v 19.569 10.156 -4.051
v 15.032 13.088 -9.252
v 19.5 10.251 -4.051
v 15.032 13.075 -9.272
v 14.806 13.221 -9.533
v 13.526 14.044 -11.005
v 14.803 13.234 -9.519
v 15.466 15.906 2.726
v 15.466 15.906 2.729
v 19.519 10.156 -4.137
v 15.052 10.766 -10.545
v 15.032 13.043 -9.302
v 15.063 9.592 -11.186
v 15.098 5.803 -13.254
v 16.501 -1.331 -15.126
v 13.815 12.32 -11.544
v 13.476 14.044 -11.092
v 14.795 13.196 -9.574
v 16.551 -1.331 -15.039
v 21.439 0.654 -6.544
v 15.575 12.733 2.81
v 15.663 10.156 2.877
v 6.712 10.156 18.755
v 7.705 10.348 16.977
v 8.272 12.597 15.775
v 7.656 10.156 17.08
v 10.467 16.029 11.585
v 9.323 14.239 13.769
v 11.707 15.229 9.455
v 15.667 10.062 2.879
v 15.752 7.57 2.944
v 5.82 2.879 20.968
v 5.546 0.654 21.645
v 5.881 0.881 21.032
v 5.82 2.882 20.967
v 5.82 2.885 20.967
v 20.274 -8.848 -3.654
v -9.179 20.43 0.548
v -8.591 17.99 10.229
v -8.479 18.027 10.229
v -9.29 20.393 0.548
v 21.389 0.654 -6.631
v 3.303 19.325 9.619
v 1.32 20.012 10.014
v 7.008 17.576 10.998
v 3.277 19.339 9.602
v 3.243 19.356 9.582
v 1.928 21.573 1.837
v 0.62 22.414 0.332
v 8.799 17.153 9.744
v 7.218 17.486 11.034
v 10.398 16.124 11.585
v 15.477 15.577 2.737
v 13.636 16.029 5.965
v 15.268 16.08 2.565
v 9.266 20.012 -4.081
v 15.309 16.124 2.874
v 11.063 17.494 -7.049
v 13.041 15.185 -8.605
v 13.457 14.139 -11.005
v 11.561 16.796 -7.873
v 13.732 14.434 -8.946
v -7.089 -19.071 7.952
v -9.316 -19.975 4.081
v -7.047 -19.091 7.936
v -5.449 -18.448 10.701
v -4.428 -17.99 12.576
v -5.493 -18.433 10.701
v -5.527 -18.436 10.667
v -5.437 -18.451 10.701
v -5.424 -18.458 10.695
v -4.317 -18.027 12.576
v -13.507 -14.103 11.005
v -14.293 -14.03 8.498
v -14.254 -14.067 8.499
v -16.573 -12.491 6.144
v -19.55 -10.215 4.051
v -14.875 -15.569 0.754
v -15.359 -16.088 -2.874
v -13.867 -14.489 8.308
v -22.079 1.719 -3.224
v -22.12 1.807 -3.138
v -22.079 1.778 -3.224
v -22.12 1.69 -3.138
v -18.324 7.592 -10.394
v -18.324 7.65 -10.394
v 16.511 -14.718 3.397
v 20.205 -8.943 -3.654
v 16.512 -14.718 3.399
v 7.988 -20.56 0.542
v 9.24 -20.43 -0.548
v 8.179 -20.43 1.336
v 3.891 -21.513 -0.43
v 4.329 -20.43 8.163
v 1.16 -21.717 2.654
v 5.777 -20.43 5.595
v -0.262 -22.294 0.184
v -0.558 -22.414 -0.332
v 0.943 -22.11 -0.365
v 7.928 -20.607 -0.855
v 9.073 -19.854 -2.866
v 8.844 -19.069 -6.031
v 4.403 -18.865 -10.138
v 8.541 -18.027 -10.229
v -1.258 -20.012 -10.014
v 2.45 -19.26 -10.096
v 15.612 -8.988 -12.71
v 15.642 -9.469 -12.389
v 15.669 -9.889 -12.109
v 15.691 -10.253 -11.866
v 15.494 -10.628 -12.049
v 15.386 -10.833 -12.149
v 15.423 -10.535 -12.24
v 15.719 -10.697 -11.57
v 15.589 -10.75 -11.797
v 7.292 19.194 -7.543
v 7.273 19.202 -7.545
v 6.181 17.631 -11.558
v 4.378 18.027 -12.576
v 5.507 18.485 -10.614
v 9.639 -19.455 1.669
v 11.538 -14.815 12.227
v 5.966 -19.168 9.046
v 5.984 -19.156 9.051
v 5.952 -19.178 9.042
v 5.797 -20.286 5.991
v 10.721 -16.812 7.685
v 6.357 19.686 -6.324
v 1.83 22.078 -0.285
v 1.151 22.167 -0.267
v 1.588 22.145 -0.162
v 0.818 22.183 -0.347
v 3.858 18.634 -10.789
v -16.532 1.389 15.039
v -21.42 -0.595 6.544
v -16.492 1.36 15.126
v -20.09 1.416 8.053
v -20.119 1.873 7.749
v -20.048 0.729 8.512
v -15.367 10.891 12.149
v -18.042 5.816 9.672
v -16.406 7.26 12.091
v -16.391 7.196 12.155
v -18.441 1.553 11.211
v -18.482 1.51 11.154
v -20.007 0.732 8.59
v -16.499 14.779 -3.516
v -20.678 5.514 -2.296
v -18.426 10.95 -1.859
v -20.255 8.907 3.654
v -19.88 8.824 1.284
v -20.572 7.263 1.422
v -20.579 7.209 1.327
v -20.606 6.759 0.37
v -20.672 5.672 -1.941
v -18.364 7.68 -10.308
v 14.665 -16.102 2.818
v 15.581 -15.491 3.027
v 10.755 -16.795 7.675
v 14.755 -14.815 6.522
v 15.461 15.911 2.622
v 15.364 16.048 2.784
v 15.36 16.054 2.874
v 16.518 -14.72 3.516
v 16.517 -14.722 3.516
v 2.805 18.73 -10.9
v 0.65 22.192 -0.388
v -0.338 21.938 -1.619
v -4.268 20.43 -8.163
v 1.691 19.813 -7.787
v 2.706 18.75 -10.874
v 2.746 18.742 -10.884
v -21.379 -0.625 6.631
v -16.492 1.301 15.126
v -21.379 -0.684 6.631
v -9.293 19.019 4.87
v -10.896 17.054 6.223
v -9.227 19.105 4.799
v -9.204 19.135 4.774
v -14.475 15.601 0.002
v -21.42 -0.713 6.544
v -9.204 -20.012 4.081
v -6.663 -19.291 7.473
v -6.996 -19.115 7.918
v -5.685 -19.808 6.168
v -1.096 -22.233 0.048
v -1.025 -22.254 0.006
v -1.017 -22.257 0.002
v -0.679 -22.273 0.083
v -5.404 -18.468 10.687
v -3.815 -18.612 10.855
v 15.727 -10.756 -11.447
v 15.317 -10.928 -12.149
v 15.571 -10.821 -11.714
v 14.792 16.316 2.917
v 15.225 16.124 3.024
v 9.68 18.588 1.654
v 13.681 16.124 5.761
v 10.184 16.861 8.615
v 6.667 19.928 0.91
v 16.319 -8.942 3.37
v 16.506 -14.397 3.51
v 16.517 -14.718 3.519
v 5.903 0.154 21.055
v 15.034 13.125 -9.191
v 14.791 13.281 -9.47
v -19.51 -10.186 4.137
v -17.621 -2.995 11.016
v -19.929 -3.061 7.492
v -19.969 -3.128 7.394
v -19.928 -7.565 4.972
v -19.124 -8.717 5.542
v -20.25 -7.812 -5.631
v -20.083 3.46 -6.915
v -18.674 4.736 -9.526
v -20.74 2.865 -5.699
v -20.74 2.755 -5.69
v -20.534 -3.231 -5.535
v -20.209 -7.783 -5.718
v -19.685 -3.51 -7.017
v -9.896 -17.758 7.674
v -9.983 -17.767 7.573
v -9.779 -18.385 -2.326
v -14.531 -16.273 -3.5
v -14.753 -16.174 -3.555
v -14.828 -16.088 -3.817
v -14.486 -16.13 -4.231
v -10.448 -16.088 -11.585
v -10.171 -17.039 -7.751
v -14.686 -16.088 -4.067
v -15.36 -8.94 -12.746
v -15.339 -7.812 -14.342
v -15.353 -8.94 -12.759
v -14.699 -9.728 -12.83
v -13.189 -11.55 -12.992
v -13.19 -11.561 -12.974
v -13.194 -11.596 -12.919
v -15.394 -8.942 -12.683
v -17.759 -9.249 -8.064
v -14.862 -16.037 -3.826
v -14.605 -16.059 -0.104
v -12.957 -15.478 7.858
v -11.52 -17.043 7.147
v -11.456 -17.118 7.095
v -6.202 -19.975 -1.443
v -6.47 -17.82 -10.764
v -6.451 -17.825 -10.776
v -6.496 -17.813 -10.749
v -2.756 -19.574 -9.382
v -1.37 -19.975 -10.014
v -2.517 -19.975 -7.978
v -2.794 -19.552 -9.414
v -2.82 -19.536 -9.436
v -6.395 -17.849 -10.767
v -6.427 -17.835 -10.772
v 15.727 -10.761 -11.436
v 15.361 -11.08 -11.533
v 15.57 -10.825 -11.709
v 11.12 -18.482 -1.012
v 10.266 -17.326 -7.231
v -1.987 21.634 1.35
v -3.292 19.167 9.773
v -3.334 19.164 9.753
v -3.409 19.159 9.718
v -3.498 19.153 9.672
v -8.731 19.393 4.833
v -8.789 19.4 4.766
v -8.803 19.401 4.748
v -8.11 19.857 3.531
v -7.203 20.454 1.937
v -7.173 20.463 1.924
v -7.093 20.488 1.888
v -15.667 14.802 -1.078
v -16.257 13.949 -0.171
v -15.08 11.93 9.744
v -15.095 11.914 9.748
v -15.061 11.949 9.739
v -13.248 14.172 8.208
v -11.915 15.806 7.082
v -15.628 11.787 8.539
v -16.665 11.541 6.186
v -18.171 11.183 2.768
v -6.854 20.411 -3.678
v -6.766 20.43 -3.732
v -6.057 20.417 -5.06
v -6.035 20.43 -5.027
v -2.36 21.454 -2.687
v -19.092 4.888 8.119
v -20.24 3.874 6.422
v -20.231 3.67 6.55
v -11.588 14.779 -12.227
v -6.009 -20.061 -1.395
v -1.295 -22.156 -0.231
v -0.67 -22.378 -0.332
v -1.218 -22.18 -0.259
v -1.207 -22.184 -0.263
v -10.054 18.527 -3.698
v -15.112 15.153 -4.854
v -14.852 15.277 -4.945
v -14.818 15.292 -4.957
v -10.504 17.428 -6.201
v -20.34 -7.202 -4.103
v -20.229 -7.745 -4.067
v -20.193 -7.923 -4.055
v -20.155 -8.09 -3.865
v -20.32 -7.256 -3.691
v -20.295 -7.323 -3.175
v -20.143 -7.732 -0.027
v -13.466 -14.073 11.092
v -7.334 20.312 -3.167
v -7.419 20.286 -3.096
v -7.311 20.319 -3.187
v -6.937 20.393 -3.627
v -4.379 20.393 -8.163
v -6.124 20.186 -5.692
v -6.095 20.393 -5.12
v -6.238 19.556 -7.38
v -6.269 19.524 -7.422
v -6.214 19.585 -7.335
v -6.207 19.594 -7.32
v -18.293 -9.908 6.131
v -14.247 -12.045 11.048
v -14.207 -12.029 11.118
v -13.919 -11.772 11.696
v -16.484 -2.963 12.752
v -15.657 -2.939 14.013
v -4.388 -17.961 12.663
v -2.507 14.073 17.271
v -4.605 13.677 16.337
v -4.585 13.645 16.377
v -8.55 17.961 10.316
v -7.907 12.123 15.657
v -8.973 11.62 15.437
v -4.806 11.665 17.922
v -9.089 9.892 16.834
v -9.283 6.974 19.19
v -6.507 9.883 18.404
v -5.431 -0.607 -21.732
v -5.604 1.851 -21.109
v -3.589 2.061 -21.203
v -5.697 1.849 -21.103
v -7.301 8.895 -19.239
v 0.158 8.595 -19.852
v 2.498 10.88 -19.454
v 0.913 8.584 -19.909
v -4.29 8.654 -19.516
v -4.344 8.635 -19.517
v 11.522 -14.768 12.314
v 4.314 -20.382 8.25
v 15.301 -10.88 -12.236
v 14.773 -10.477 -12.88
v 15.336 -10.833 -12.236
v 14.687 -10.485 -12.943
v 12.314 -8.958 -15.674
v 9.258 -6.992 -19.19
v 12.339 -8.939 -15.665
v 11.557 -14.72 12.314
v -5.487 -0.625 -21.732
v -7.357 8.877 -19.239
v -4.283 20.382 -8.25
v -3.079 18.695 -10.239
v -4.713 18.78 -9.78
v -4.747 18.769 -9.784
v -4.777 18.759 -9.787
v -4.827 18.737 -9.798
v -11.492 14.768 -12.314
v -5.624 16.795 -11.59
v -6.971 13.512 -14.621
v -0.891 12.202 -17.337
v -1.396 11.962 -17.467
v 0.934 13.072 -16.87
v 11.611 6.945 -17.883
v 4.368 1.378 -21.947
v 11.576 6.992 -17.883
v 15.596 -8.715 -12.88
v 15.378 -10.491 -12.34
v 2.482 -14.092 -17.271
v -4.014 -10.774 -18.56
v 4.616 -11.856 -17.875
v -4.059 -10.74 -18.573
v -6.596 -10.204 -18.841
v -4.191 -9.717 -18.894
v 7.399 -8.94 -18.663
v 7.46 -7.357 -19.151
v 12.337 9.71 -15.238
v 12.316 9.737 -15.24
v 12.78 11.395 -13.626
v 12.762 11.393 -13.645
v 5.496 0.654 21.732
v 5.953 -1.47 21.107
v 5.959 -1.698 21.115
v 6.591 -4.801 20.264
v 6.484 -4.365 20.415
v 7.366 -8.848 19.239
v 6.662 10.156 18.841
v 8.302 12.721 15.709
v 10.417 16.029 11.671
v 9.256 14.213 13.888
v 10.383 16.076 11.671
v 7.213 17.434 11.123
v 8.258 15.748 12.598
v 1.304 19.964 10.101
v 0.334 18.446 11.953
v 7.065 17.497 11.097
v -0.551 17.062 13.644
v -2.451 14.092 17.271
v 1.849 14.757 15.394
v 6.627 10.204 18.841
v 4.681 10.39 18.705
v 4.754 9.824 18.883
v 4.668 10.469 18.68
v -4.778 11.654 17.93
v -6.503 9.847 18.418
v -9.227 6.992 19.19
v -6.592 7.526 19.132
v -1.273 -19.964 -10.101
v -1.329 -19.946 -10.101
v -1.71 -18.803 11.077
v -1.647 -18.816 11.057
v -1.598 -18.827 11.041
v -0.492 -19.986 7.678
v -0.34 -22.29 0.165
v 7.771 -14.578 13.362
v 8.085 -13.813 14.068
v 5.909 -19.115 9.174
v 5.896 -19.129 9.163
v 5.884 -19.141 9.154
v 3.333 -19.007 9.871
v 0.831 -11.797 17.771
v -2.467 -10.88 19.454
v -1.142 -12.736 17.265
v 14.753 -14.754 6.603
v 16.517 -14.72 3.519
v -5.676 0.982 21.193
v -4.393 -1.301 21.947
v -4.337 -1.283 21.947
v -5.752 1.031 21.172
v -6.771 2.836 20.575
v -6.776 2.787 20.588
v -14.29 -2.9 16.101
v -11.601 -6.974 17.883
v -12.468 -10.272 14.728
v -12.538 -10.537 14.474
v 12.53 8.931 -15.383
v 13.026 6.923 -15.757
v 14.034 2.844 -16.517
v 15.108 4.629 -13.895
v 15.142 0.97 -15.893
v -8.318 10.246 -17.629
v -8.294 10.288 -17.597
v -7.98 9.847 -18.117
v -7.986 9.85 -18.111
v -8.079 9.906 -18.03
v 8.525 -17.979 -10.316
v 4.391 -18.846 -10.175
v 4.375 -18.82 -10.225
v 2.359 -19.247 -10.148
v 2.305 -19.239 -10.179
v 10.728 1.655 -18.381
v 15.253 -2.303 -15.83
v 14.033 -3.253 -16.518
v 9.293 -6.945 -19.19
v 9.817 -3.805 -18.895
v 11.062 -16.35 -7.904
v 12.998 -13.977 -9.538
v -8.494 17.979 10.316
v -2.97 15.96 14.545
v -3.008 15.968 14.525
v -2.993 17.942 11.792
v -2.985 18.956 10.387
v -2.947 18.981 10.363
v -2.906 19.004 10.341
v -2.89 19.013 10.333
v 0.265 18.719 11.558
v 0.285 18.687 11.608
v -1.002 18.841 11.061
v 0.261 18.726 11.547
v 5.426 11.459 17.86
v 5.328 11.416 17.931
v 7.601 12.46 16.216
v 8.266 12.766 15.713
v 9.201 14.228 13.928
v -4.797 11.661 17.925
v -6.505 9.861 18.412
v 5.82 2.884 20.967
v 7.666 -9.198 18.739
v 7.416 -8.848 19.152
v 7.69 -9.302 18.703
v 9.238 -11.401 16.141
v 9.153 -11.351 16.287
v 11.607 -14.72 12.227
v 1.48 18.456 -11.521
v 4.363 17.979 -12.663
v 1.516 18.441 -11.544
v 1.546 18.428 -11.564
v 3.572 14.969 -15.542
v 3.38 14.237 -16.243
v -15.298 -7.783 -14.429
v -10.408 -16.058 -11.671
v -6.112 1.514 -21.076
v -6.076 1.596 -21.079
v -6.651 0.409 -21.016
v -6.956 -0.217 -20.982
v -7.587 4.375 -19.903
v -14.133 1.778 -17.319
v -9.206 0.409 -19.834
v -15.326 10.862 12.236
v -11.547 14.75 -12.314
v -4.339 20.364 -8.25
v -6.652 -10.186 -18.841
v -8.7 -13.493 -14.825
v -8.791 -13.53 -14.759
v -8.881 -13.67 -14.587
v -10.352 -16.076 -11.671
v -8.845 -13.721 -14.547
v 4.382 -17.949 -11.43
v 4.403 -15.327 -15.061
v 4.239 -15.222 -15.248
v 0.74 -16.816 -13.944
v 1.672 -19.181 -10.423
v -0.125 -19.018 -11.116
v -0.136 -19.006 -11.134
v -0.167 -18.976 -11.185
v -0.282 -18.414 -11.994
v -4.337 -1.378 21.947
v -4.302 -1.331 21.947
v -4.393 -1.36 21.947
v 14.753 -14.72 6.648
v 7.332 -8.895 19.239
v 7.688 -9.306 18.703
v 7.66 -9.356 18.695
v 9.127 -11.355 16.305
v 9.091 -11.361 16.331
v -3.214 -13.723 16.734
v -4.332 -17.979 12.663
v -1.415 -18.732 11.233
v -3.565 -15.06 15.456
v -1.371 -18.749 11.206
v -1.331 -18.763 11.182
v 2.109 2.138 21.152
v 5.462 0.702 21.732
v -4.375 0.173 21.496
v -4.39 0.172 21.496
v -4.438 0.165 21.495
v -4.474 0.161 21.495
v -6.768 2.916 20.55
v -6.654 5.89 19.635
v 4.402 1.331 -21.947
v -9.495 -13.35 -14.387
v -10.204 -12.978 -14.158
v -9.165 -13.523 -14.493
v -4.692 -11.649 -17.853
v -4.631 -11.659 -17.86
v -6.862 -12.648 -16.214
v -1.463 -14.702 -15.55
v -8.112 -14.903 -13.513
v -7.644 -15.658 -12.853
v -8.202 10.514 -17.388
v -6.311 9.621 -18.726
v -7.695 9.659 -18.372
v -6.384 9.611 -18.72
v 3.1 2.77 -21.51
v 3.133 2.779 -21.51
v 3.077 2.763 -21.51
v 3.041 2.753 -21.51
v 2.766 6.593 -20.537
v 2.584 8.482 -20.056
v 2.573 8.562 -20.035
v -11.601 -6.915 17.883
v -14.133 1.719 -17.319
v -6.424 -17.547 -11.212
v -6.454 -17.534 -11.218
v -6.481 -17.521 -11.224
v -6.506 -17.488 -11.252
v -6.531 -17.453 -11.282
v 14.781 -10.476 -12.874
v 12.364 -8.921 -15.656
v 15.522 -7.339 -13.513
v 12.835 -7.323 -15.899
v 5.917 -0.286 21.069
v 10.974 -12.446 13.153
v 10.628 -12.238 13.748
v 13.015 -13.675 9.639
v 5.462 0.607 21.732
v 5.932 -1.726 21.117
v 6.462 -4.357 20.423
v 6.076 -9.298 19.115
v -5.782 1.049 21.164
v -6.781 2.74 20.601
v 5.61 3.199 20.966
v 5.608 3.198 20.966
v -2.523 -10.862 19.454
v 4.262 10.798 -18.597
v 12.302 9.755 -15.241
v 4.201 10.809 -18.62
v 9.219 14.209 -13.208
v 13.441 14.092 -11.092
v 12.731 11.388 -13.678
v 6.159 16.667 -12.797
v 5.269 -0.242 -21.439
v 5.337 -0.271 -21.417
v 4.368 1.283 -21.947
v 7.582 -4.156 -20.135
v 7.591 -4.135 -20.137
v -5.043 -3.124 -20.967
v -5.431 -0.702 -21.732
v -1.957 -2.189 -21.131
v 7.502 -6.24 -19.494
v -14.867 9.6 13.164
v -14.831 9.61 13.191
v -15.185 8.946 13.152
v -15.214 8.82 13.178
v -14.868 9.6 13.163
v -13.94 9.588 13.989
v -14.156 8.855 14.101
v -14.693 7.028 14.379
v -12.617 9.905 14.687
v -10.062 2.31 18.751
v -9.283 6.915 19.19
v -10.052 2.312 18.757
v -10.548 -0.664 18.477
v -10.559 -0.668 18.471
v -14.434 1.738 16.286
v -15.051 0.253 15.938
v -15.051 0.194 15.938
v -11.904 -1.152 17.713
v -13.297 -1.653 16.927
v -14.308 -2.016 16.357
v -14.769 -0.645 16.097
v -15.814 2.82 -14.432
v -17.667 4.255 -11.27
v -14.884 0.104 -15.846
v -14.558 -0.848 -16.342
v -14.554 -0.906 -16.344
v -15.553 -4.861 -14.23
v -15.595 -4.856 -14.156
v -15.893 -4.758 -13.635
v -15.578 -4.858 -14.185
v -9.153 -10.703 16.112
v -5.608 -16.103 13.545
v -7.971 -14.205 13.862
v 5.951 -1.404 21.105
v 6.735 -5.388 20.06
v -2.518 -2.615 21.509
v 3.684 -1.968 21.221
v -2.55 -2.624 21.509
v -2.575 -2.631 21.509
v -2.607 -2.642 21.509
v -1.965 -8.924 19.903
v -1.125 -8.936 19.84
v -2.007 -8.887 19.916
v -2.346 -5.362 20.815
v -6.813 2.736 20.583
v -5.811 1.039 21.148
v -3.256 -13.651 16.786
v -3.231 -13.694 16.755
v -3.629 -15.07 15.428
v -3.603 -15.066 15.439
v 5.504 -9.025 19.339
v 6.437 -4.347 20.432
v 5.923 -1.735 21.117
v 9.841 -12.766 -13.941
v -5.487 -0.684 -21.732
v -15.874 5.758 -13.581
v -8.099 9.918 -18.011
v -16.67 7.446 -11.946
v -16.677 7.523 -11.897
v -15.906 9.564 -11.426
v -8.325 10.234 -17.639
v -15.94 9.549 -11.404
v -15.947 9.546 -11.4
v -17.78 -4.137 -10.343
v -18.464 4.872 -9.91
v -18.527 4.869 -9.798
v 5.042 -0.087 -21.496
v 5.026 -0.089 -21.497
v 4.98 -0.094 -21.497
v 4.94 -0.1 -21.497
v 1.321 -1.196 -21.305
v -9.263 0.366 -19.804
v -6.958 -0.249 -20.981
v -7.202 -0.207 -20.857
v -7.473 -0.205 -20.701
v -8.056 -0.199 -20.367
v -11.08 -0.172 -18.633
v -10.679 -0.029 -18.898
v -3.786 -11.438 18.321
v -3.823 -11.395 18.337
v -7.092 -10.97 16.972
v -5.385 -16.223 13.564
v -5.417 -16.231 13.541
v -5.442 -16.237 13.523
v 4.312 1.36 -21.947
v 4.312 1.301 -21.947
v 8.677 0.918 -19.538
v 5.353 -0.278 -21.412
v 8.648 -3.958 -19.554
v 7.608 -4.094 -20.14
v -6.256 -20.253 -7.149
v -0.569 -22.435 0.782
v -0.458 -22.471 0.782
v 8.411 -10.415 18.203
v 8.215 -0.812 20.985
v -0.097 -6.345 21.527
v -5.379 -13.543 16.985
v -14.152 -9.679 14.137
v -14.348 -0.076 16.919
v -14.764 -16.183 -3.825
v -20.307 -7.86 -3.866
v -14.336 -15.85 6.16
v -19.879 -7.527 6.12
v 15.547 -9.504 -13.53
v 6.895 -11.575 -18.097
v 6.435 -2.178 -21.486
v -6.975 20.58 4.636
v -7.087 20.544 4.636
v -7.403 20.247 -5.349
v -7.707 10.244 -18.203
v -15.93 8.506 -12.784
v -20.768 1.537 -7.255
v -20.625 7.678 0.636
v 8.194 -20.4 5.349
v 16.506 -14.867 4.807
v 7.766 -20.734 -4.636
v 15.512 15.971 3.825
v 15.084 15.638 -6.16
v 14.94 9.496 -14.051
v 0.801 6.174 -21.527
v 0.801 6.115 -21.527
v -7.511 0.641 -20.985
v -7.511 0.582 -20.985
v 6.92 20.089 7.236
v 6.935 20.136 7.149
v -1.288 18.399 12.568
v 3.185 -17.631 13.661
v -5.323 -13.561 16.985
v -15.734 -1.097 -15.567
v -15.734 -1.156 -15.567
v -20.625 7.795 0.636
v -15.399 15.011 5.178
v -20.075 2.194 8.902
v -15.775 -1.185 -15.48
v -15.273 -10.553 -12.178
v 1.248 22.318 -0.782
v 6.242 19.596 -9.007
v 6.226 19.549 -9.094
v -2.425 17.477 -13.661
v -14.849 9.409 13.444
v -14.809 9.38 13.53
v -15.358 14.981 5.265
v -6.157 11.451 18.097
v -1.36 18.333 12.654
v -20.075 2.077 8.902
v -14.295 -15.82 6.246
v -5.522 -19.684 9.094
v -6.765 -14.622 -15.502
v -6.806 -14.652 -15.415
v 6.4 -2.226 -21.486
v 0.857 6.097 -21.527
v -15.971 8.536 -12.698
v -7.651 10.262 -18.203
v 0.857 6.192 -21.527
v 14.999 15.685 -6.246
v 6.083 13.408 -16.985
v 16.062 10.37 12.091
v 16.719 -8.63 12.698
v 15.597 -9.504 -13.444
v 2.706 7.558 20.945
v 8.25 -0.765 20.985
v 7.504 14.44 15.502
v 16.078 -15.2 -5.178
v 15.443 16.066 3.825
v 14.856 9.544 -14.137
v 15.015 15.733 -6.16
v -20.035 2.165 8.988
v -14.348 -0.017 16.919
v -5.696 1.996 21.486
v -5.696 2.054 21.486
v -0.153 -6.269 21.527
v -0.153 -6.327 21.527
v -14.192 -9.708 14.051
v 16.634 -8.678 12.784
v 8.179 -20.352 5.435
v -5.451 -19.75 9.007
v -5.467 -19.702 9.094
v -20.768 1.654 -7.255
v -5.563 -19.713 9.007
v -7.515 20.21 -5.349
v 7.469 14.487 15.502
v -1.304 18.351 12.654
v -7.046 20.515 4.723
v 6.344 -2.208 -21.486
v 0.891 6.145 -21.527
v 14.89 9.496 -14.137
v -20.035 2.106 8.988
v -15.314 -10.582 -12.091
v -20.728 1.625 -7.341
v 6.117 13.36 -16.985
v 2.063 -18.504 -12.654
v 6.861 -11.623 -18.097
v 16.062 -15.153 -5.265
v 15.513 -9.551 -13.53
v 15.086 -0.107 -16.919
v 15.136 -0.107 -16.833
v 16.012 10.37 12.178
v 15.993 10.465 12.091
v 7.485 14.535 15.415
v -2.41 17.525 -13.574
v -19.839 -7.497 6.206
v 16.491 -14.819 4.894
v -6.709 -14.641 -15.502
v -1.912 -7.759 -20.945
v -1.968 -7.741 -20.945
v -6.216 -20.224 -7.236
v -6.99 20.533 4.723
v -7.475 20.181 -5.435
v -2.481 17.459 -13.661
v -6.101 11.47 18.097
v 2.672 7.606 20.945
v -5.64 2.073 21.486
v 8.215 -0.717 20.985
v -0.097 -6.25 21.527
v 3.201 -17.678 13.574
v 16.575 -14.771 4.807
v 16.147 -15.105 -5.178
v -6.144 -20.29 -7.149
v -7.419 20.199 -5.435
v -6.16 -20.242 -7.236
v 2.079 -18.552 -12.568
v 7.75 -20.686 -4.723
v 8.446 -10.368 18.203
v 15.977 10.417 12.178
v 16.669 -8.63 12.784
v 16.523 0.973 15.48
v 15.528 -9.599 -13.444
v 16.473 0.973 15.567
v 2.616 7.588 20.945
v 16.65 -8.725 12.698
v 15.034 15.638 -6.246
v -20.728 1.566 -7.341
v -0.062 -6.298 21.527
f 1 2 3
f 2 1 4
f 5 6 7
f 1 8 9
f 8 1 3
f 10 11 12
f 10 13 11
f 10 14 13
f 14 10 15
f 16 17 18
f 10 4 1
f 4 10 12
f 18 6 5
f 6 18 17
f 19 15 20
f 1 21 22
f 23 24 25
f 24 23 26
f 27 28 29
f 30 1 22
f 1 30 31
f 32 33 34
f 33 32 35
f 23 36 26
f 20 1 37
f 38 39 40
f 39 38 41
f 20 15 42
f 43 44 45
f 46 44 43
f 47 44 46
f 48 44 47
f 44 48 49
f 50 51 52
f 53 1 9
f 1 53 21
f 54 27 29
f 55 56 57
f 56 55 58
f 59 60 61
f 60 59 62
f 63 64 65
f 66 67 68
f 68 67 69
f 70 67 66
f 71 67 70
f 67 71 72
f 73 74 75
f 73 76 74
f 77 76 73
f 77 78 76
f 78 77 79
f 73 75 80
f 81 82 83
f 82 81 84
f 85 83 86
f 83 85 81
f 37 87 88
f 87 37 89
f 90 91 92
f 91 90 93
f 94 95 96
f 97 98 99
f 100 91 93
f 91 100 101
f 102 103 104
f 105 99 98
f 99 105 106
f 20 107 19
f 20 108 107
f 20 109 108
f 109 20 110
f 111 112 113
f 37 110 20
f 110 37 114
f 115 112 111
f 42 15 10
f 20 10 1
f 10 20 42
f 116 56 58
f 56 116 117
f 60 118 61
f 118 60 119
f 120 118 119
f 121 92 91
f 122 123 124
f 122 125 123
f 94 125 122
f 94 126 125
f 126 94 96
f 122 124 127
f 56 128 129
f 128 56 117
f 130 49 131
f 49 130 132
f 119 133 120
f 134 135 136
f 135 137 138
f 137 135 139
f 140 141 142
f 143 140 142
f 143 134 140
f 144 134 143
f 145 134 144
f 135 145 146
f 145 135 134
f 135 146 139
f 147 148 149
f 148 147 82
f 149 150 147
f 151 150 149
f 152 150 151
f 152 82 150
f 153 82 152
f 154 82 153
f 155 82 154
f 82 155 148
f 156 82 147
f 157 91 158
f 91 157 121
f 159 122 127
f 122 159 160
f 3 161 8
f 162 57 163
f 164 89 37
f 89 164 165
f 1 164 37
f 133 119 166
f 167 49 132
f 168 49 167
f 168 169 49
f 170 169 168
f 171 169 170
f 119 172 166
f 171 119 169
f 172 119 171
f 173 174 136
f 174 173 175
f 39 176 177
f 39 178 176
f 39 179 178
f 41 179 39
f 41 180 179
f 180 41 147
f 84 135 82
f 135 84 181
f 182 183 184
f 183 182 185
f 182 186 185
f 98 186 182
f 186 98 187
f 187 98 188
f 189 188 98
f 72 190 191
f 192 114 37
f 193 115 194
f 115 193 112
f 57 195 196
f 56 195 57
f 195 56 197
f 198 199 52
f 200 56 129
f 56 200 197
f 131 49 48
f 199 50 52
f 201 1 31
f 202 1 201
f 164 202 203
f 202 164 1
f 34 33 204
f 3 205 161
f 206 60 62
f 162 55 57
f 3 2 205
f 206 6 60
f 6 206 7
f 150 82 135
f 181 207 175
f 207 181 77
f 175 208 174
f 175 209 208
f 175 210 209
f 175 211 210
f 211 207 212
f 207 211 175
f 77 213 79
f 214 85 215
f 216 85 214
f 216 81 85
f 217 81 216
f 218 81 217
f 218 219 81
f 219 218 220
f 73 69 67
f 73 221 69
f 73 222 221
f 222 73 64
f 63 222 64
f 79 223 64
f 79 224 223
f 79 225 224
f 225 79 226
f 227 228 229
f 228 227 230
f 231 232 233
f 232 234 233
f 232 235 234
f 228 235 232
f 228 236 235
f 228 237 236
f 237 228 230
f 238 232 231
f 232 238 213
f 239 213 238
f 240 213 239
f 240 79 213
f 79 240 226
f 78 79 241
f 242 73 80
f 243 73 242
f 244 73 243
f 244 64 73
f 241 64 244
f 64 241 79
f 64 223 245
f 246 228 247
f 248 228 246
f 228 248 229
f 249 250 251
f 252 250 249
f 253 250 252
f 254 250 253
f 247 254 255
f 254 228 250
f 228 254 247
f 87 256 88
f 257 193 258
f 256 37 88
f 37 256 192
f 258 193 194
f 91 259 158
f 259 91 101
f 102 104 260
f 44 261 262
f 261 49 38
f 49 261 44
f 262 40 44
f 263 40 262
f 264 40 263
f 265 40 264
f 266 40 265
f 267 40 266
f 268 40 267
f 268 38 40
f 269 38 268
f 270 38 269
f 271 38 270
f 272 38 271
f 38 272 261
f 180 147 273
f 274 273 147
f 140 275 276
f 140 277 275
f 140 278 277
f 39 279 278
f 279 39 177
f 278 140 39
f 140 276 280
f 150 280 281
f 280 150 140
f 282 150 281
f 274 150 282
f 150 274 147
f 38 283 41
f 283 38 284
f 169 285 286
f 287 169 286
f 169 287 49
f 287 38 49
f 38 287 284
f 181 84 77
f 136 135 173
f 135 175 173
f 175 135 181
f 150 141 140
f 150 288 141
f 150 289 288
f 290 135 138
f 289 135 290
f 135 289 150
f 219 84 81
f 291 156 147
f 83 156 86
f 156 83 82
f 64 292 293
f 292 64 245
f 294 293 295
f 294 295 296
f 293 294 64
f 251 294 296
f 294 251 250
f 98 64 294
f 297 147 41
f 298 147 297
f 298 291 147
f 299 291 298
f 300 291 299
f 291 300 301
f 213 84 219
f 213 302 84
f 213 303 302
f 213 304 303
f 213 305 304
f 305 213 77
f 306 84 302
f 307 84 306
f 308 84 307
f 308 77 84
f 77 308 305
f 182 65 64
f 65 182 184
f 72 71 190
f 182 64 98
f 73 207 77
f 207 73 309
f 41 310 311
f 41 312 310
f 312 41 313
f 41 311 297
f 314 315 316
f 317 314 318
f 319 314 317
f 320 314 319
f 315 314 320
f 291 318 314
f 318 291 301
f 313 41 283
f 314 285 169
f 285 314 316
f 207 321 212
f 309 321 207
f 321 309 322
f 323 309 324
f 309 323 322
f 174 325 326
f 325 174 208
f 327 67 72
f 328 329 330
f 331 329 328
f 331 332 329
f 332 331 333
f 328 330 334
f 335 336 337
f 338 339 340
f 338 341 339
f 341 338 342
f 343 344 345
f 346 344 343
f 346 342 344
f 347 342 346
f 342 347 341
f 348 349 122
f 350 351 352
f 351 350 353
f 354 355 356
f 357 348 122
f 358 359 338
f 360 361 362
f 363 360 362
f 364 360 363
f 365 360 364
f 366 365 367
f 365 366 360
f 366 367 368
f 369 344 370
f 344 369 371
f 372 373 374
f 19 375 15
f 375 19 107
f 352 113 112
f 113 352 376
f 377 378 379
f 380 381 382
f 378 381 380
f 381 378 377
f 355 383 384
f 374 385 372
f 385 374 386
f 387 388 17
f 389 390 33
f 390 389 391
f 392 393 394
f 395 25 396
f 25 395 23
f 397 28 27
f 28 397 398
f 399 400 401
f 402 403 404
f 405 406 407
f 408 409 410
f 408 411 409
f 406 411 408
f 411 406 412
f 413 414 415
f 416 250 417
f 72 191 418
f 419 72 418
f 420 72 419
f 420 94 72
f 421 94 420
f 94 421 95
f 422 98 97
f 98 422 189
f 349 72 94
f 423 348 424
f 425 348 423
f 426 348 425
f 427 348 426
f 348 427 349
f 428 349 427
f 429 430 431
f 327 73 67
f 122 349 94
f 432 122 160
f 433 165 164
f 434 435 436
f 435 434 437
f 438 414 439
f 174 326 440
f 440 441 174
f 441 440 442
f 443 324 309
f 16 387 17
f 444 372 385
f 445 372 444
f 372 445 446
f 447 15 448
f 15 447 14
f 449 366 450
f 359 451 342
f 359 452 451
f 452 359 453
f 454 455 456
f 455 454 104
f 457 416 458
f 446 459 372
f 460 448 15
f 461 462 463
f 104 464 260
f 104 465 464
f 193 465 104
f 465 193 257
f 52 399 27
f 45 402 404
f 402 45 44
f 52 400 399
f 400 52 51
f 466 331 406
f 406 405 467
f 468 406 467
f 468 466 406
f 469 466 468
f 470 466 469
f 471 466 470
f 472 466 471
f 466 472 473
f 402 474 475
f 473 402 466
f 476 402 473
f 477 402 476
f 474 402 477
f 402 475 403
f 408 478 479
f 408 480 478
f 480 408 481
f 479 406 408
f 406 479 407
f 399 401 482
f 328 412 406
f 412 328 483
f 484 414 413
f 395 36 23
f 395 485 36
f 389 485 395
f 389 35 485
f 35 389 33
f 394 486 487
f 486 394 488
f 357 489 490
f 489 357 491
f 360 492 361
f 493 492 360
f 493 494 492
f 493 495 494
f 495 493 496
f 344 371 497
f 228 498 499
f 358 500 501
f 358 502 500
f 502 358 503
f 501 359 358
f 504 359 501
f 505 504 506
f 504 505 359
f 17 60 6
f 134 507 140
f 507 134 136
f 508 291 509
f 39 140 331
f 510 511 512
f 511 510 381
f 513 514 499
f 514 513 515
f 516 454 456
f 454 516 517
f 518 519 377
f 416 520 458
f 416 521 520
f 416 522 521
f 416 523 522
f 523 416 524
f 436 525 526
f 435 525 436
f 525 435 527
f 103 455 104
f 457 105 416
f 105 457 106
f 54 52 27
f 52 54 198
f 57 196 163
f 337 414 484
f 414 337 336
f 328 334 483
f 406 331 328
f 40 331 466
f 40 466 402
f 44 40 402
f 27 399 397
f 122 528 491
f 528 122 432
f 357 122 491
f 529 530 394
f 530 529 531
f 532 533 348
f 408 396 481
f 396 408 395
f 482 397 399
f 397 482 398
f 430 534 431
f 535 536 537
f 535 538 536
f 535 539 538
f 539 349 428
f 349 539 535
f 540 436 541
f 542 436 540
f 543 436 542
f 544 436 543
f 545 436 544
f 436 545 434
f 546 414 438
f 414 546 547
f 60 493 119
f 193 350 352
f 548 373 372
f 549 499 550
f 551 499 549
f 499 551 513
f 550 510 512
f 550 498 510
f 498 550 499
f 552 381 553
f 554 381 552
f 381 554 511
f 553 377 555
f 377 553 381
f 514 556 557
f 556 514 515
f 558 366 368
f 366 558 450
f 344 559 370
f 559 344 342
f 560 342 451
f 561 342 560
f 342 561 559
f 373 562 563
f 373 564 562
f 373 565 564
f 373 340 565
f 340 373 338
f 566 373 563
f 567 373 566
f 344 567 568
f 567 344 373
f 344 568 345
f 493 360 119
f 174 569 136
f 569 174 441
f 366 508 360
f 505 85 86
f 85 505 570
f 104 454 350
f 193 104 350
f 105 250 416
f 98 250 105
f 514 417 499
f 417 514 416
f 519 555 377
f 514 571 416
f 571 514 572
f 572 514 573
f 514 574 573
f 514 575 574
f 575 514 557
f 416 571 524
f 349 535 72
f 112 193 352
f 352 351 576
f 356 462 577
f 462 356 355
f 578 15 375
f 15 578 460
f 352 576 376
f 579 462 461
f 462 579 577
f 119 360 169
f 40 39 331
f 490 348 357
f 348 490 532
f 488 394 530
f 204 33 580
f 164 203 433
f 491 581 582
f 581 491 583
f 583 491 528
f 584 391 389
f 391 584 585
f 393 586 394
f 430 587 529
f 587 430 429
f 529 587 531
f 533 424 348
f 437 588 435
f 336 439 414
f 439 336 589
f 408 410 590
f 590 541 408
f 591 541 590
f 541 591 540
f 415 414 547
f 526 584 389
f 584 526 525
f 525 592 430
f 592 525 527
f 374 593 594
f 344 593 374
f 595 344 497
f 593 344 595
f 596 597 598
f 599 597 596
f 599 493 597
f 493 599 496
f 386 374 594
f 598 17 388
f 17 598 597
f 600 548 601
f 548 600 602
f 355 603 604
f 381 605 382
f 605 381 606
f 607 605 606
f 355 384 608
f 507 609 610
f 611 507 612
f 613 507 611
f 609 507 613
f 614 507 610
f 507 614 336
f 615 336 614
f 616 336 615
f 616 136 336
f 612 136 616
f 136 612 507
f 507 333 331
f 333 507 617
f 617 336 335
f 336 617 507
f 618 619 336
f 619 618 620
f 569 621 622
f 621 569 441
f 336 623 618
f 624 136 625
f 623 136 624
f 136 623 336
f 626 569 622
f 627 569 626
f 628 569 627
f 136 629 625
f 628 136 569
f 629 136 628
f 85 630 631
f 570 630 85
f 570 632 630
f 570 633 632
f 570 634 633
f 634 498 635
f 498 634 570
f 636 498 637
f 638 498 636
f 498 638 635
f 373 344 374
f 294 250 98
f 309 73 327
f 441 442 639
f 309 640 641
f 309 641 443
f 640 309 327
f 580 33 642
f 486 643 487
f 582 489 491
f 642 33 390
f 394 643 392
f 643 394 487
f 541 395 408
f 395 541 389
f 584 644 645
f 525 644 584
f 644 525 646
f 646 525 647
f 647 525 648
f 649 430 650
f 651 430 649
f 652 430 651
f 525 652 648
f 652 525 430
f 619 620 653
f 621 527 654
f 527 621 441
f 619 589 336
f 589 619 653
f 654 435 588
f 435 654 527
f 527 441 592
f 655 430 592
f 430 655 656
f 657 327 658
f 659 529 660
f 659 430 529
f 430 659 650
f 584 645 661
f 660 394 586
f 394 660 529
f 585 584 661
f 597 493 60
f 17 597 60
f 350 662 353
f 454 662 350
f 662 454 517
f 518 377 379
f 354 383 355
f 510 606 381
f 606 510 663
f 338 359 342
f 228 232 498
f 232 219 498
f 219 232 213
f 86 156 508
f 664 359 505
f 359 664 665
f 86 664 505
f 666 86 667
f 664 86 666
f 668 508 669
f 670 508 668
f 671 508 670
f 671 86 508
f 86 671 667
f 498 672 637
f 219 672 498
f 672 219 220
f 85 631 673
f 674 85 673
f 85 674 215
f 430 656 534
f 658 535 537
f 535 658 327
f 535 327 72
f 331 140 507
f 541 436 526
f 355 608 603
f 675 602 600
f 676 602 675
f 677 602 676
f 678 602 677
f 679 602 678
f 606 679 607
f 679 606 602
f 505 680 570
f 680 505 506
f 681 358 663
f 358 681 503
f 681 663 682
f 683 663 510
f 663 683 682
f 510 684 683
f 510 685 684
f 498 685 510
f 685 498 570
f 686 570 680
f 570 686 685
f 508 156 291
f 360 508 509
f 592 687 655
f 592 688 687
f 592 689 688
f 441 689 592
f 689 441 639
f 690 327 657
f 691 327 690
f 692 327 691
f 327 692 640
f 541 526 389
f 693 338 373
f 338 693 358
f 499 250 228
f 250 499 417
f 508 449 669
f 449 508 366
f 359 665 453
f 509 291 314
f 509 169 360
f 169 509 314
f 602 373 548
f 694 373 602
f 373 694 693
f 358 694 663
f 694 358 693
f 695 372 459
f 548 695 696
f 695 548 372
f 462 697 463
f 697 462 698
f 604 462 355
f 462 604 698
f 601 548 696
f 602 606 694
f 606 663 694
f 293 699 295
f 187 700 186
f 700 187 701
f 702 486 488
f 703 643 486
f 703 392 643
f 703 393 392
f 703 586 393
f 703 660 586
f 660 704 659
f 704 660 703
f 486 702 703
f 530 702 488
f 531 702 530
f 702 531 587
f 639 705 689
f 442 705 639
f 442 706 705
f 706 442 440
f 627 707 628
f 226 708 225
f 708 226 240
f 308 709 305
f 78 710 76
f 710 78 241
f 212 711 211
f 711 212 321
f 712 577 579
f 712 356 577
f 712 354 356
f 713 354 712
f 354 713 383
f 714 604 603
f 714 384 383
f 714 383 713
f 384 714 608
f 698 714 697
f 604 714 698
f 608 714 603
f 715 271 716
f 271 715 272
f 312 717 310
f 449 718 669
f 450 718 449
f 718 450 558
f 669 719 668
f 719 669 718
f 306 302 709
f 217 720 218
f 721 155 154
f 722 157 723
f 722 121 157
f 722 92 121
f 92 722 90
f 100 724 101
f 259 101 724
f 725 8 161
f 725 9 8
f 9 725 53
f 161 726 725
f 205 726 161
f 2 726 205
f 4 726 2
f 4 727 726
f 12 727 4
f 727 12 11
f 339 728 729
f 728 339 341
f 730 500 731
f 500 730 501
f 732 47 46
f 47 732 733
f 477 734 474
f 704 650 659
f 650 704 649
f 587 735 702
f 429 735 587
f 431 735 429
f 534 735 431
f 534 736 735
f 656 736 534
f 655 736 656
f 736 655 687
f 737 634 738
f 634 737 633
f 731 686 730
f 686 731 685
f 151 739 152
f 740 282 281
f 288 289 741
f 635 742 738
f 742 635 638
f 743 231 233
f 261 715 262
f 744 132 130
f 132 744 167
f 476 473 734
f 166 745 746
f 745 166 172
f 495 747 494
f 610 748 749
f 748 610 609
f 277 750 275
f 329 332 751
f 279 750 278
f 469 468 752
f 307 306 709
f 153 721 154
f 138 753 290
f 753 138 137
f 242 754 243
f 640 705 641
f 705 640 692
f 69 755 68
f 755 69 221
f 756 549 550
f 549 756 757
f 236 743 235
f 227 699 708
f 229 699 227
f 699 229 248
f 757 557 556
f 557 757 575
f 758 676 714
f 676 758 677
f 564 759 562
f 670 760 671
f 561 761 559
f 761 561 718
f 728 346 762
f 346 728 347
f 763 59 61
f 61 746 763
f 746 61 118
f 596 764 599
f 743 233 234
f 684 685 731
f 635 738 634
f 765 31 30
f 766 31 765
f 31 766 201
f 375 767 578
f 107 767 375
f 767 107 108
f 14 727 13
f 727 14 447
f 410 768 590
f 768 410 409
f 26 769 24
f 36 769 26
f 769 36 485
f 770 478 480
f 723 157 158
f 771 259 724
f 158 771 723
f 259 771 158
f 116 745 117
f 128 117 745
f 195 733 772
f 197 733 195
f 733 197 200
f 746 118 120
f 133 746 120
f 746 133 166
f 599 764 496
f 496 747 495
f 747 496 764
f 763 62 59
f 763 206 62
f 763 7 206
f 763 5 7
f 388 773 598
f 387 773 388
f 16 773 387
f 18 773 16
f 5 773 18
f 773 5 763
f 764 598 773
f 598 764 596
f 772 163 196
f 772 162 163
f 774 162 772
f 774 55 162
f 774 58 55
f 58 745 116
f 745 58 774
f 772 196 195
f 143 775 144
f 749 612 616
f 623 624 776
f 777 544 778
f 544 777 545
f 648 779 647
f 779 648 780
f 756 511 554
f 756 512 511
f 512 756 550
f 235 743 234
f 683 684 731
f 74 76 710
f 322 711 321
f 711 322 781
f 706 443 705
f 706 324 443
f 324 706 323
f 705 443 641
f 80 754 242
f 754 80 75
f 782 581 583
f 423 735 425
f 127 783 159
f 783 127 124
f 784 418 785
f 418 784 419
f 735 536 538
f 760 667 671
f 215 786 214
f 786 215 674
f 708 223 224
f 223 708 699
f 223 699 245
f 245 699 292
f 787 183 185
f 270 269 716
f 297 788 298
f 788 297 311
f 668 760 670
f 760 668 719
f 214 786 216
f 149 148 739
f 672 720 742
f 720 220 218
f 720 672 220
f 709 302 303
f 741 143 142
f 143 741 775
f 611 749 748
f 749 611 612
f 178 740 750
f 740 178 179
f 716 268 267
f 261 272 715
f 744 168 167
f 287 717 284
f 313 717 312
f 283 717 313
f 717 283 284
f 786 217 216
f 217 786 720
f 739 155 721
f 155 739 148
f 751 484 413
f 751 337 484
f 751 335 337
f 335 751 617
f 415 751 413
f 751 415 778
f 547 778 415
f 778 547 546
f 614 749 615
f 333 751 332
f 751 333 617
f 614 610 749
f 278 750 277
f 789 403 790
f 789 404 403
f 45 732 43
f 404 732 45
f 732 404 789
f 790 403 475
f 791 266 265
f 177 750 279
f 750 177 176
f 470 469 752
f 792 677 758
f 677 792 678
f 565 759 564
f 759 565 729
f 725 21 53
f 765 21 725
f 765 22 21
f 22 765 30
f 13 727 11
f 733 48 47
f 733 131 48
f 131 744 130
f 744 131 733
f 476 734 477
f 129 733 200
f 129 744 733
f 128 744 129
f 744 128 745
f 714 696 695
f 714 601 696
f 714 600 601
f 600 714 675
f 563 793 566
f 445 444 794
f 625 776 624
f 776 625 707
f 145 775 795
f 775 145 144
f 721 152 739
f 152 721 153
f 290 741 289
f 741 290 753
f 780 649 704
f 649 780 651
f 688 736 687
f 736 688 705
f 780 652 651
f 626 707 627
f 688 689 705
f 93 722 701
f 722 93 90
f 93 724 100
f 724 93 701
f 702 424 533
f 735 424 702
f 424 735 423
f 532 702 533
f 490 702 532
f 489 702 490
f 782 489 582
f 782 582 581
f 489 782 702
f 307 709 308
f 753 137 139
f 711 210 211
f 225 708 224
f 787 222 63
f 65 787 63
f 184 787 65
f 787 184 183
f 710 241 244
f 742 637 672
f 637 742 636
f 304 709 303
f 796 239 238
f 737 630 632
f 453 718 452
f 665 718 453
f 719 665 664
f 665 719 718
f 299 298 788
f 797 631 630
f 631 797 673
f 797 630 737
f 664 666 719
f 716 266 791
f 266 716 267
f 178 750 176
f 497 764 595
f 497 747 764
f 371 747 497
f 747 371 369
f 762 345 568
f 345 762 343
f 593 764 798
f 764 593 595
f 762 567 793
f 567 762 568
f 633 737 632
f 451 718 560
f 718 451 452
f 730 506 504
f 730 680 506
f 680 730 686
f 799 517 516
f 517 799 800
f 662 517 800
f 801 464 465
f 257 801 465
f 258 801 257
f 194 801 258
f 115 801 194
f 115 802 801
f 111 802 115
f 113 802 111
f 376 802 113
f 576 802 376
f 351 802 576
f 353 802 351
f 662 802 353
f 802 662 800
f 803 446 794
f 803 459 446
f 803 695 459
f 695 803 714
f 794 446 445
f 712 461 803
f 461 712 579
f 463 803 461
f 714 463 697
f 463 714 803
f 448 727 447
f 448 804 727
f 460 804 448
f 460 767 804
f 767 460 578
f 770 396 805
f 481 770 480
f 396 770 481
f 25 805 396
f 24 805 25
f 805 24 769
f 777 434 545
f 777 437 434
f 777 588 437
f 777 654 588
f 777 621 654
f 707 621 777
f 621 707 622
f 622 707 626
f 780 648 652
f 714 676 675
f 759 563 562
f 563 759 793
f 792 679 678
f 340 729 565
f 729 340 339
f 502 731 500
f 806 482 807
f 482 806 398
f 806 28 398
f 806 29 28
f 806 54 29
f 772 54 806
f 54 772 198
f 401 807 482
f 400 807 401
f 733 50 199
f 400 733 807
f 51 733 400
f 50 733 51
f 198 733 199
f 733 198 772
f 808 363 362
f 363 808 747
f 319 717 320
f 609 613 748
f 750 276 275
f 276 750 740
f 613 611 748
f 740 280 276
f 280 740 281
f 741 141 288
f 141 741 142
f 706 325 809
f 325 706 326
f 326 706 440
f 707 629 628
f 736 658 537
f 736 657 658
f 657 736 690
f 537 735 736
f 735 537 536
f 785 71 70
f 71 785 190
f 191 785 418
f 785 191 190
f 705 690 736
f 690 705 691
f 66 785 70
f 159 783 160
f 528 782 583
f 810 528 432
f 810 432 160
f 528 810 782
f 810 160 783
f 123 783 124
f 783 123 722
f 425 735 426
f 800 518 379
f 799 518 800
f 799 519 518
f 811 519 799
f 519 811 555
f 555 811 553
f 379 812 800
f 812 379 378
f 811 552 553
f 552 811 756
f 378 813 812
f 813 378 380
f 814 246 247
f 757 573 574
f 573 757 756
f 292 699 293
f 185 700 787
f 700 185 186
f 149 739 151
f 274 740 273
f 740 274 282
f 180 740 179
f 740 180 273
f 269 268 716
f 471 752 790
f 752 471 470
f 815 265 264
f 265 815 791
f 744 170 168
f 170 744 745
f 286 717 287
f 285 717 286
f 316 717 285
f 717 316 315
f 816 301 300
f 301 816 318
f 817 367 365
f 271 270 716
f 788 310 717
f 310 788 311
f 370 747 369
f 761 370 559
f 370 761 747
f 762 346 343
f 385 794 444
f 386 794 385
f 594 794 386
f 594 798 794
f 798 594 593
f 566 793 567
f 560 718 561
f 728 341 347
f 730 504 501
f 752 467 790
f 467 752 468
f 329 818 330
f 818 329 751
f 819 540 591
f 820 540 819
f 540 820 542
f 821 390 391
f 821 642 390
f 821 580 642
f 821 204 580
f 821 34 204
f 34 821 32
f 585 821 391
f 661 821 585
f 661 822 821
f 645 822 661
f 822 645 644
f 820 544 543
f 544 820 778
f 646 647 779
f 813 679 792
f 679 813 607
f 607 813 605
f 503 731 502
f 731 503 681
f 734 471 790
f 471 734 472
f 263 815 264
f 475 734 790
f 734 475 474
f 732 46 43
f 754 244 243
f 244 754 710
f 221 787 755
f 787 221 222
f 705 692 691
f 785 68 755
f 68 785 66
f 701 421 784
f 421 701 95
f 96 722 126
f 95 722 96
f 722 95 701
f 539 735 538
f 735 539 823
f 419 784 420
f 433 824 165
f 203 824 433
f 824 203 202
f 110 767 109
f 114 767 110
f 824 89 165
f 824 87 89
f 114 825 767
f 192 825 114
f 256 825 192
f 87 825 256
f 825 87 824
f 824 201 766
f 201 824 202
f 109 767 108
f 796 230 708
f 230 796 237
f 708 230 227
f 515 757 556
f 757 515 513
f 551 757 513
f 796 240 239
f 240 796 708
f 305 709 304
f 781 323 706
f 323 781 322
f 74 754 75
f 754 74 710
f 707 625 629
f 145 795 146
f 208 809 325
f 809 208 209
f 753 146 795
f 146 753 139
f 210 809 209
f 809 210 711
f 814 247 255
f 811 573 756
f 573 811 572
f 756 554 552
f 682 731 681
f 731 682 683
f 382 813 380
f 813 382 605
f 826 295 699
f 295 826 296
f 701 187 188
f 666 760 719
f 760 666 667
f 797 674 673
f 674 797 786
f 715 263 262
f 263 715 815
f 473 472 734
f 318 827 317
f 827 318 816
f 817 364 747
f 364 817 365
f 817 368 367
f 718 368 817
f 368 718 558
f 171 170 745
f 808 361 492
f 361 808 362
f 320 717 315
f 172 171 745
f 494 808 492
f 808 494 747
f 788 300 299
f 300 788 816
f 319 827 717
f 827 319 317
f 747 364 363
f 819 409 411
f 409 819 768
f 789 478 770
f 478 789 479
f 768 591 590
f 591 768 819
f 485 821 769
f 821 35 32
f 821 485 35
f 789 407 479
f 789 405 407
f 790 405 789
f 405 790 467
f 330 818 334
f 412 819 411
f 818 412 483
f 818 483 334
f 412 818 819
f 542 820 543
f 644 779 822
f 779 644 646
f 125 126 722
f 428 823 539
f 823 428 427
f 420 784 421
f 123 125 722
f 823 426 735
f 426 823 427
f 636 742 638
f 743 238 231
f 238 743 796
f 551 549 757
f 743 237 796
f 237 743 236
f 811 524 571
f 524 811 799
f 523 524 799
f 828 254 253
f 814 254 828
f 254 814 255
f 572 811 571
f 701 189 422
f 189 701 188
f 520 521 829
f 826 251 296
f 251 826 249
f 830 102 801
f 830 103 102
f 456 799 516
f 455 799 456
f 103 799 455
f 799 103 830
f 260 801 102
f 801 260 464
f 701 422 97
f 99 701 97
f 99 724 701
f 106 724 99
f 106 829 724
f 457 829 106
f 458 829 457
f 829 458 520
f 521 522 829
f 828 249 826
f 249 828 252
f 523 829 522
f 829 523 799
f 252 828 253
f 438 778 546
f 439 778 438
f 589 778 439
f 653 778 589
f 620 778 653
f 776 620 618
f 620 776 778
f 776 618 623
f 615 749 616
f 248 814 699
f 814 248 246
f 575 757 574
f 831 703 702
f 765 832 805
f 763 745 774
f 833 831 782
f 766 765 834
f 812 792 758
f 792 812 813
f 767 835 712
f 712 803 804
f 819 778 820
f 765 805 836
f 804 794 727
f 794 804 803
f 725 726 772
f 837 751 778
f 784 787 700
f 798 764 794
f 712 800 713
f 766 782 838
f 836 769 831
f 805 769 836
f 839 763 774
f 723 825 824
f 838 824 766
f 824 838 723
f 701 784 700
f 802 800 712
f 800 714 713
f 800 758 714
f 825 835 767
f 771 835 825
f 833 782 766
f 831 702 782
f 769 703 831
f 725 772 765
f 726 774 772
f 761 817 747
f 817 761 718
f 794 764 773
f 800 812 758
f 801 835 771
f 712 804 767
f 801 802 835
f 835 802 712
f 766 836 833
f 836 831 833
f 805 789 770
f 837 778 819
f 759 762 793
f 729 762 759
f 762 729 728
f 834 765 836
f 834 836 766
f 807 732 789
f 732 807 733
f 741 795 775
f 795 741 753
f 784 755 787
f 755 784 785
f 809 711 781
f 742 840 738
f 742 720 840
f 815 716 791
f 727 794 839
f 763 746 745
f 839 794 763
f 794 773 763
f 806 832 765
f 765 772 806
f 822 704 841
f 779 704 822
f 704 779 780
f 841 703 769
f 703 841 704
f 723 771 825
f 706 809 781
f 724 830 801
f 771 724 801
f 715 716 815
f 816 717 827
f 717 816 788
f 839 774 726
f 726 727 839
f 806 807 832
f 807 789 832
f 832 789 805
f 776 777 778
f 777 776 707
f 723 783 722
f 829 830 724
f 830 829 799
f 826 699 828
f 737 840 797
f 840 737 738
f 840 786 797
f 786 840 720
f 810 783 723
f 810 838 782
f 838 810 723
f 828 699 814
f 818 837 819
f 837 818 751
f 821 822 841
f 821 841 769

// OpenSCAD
// Auto-generated OpenSCAD file

    inner_points = 10*[[1.6046801444042071, -1.510518771363498, -0.51780774687208], [-0.7434345422794115, 2.015149679052852, -0.5348754332596579], [0.7734765787975868, -2.063842760532919, -0.4636487630145585], [-1.5746381078860319, 1.4618256898834308, -0.4807164494021364], [1.647527110349813, -1.4771486205669213, 0.4807164494021364], [-0.7005875763338056, 2.0485198298494285, 0.4636487630145585], [0.8163235447431927, -2.0304726097363424, 0.5348754332596579], [-1.531791141940426, 1.4951958406800074, 0.51780774687208], [0.6384522963590755, -0.21782729456619615, -2.1399731111236644], [0.08413761133612133, 0.6144701258584091, -2.1440022453297805], [-0.1927512692475448, -0.7711512837356173, -2.085814127266143], [-0.7470659542704989, 0.06114613668898816, -2.089843261472259], [0.8199549567342801, -0.0764690673724786, 2.089843261472259], [0.26564027171132587, 0.7558283530521267, 2.085814127266143], [-0.011248608872340221, -0.6297930565418997, 2.1440022453297805], [-0.5655632938952944, 0.2025043638827057, 2.1399731111236644], [1.4983810792725356, 1.5637611853237816, -0.6159872338465537], [-1.4683390427543601, -1.6124542668038486, -0.3825369624276627], [-2.0226537277773144, -0.7801568463792433, -0.38656609663377894], [1.5412280452181413, 1.597131336120358, 0.3825369624276627], [-1.4254920768087544, -1.5790841160072722, 0.6159872338465537], [-1.9798067618317083, -0.7467866955826666, 0.6119580996404375], [0.12173940895788779, 2.2222892177989073, -0.07818380251905571], [-0.048850406494106685, -2.237612148482398, 0.07818380251905571], [-2.054379777370347, 0.7736682073626848, 0.0636062580160924], [0.6845409546055283, -1.1575201029478461, -1.8010730352062194], [-0.7666737312477581, 1.0214628324726316, -1.8116214455030666], [0.8395627337115392, -1.0367857631561221, 1.8116214455030666], [-0.6116519521417472, 1.1421971722643556, 1.8010730352062194], [1.4840184706191157, 0.9496289399635032, -1.4050596644138698], [-1.5233042813157396, -1.0523160596421408, -1.2091106200212], [1.5961932837795207, 1.0369931289586503, 1.2091106200212], [-1.4111294681553346, -0.9649518706469937, 1.4050596644138698], [1.549714905842828, -0.9503805642017904, -1.3443814044656173], [-0.2440850958178369, 1.7429904657899544, -1.357419956647079], [0.2047992851212129, -1.845677585468592, -1.2567503277879908], [-1.5890007165394517, 0.8476934445231528, -1.2697888799694526], [1.661889719003233, -0.8630163752066433, 1.2697888799694526], [-0.1319102826574318, 1.8303546547851015, 1.2567503277879908], [0.31697409828161804, -1.758313396473445, 1.357419956647079], [-1.4768259033790467, 0.9350576335182998, 1.3443814044656173], [1.5036262475963749, -0.010687755820140424, -1.683281480383062], [0.6067262467660426, 1.335997759175732, -1.689800756473793], [-0.6724929387318603, -1.4593087662563635, -1.541491419847914], [-1.5693929395621924, -0.11262325126049072, -1.5480106959386448], [1.6422819420259736, 0.09730032057700028, 1.5480106959386448], [0.7453819411956415, 1.443985835572873, 1.541491419847914], [-0.5338372443022614, -1.3513206898592225, 1.689800756473793], [-1.4307372451325937, -0.004635174863350026, 1.683281480383062], [0.6210888554194628, 1.9501300045360104, -0.9007283259064769], [-0.617527700170481, -2.0194469734180718, -0.7149177622543765], [-2.0687423860237675, 0.15953596200240622, -0.7254661725512236], [0.6904167026342621, 2.0041240427345812, 0.7149177622543765], [-0.5481998529556816, -1.965452935219501, 0.9007283259064769], [-1.999414538808968, 0.21353000020097673, 0.8901799156096298]];

    outer_points = 10*[[1.6418145044797559, -1.472026782007085, 0.35163939402966377], [-0.4298446701047658, 2.033447834240434, -0.8163280238391935], [0.9209550497834971, -2.033447834240434, -0.05476932719099553], [-1.1507041248010244, 1.472026782007085, -1.2227367450598527], [1.1507041248010244, -1.472026782007085, 1.2227367450598527], [-0.9209550497834971, 2.033447834240434, 0.05476932719099553], [0.4298446701047658, -2.033447834240434, 0.8163280238391935], [-1.6418145044797559, 1.472026782007085, -0.35163939402966377], [1.6451443994420738, -0.13305462530052709, -1.5039495833206327], [1.156092008029022, 0.6944756775338761, -1.7796692894425854], [0.924284944745815, -0.6944756775338761, -1.910358304541292], [0.43523255333276334, 0.13305462530052709, -2.1860780106632447], [-0.43523255333276334, -0.13305462530052709, 2.1860780106632447], [-0.924284944745815, 0.6944756775338761, 1.910358304541292], [-1.156092008029022, -0.6944756775338761, 1.7796692894425854], [-1.6451443994420738, 0.13305462530052709, 1.5039495833206327], [1.5278338202912307, 1.602874022047165, 0.287378956293666], [-1.0367234406124997, -1.602874022047165, -1.158476307323855], [-1.525775832025551, -0.7753437192127617, -1.4341960134458078], [1.0367234406124997, 1.602874022047165, 1.158476307323855], [-1.5278338202912307, -1.602874022047165, -0.287378956293666], [-2.0168862117042825, -0.7753437192127617, -0.5630986624156187], [0.05891318954734109, 2.231926079561001, 0.03321428868135433], [-0.05891318954734109, -2.231926079561001, -0.03321428868135433], [-1.8283213639591795, 0.7621066828143632, -1.0307775567987123], [1.5286049144521512, -1.0832512297704806, -1.2149081307709086], [0.24824913145336436, 1.0832512297704806, -1.9367516927663138], [-0.24824913145336436, -1.0832512297704806, 1.9367516927663138], [-1.5286049144521512, 1.0832512297704806, 1.2149081307709086], [1.9469188372147817, 1.0156202244899935, -0.4050809529031537], [-0.6611751709879975, -1.0156202244899935, -1.8754815196038797], [0.6611751709879975, 1.0156202244899935, 1.8754815196038797], [-1.9469188372147817, -1.0156202244899935, 0.4050809529031537], [2.017362774104258, -0.8847729844499134, -0.36536581825036085], [0.434755990932788, 1.793171328963202, -1.2576135299972653], [0.8509876752939962, -1.793171328963202, -1.022948942509768], [-0.7316191078774735, 0.8847729844499134, -1.9151966542566723], [0.7316191078774735, -0.8847729844499134, 1.9151966542566723], [-0.8509876752939962, 1.793171328963202, 1.022948942509768], [-0.434755990932788, -1.793171328963202, 1.2576135299972653], [-2.017362774104258, 0.8847729844499134, 0.36536581825036085], [2.1339022590941807, 0.0654236200200401, -0.6544072708000847], [1.3425988675084457, 1.4043957767265978, -1.100531126673537], [0.24666770558766005, -1.4043957767265978, -1.7183991162801513], [-0.5446356859980751, -0.0654236200200401, -2.1645229721536037], [0.5446356859980751, 0.0654236200200401, 2.1645229721536037], [-0.24666770558766005, 1.4043957767265978, 1.7183991162801513], [-1.3425988675084457, -1.4043957767265978, 1.100531126673537], [-2.1339022590941807, -0.0654236200200401, 0.6544072708000847], [0.9235138505848948, 1.9916495742837694, -0.4080712174767174], [-0.12888056403684184, -1.9916495742837694, -1.0013939040001267], [-1.4092363470356286, 0.17485288525719178, -1.7232374659955318], [0.12888056403684184, 1.9916495742837694, 1.0013939040001267], [-0.9235138505848948, -1.9916495742837694, 0.4080712174767174], [-2.2038696335836816, 0.17485288525719178, -0.31377234451868774]];

    // Convex hull for inner set (I)
    module inner_hull() {
        hull() {
            for (p = inner_points) {
                translate(p) sphere(r=0.1);
            }
        }
    }

    // Convex hull for outer set (O) minus inner hull (O \ I)
    module outer_minus_inner() {
        difference() {
            hull() {
                for (p = outer_points) {
                    translate(p) sphere(r=0.1);
                }
            }
            inner_hull(); // Subtract inner hull
        }
    }

    // Convex hull for outer set (O) minus all translated inner hulls
    module outer_minus_AllTranslationInner() {
        difference() {
            hull() {
                for (p = outer_points) {
                    translate(p) sphere(r=0.1);
                }
            }
            hull() {
                translate([0,0,50]) inner_hull();
                translate([0,0,-50]) inner_hull();
            }; // Subtract translated inner hulls
        }
    }

    // Difference between outer_minus_inner and outer_minus_AllTranslationInner
    module outer_minus_inner_diff() {
        difference() {
            // Outer minus inner
            difference() {
                hull() {
                    for (p = outer_points) {
                        translate(p) sphere(r=0.1);
                    }
                }
                inner_hull();
            }

            // Subtract Outer minus AllTranslationInner
            difference() {
                hull() {
                    for (p = outer_points) {
                        translate(p) sphere(r=0.1);
                    }
                }
                hull() {
                    translate([0,0,50]) inner_hull();
                    translate([0,0,-50]) inner_hull();
                };
            }
        }
    }

    // Rendering all with colors applied
    color([1, 0, 0, 0.5]) inner_hull(); // Transparent red
    color([0, 1, 0, 1]) outer_minus_AllTranslationInner(); // Opaque green
    color([1, 1, 0, 1]) outer_minus_inner_diff(); // Opaque yellow
    
